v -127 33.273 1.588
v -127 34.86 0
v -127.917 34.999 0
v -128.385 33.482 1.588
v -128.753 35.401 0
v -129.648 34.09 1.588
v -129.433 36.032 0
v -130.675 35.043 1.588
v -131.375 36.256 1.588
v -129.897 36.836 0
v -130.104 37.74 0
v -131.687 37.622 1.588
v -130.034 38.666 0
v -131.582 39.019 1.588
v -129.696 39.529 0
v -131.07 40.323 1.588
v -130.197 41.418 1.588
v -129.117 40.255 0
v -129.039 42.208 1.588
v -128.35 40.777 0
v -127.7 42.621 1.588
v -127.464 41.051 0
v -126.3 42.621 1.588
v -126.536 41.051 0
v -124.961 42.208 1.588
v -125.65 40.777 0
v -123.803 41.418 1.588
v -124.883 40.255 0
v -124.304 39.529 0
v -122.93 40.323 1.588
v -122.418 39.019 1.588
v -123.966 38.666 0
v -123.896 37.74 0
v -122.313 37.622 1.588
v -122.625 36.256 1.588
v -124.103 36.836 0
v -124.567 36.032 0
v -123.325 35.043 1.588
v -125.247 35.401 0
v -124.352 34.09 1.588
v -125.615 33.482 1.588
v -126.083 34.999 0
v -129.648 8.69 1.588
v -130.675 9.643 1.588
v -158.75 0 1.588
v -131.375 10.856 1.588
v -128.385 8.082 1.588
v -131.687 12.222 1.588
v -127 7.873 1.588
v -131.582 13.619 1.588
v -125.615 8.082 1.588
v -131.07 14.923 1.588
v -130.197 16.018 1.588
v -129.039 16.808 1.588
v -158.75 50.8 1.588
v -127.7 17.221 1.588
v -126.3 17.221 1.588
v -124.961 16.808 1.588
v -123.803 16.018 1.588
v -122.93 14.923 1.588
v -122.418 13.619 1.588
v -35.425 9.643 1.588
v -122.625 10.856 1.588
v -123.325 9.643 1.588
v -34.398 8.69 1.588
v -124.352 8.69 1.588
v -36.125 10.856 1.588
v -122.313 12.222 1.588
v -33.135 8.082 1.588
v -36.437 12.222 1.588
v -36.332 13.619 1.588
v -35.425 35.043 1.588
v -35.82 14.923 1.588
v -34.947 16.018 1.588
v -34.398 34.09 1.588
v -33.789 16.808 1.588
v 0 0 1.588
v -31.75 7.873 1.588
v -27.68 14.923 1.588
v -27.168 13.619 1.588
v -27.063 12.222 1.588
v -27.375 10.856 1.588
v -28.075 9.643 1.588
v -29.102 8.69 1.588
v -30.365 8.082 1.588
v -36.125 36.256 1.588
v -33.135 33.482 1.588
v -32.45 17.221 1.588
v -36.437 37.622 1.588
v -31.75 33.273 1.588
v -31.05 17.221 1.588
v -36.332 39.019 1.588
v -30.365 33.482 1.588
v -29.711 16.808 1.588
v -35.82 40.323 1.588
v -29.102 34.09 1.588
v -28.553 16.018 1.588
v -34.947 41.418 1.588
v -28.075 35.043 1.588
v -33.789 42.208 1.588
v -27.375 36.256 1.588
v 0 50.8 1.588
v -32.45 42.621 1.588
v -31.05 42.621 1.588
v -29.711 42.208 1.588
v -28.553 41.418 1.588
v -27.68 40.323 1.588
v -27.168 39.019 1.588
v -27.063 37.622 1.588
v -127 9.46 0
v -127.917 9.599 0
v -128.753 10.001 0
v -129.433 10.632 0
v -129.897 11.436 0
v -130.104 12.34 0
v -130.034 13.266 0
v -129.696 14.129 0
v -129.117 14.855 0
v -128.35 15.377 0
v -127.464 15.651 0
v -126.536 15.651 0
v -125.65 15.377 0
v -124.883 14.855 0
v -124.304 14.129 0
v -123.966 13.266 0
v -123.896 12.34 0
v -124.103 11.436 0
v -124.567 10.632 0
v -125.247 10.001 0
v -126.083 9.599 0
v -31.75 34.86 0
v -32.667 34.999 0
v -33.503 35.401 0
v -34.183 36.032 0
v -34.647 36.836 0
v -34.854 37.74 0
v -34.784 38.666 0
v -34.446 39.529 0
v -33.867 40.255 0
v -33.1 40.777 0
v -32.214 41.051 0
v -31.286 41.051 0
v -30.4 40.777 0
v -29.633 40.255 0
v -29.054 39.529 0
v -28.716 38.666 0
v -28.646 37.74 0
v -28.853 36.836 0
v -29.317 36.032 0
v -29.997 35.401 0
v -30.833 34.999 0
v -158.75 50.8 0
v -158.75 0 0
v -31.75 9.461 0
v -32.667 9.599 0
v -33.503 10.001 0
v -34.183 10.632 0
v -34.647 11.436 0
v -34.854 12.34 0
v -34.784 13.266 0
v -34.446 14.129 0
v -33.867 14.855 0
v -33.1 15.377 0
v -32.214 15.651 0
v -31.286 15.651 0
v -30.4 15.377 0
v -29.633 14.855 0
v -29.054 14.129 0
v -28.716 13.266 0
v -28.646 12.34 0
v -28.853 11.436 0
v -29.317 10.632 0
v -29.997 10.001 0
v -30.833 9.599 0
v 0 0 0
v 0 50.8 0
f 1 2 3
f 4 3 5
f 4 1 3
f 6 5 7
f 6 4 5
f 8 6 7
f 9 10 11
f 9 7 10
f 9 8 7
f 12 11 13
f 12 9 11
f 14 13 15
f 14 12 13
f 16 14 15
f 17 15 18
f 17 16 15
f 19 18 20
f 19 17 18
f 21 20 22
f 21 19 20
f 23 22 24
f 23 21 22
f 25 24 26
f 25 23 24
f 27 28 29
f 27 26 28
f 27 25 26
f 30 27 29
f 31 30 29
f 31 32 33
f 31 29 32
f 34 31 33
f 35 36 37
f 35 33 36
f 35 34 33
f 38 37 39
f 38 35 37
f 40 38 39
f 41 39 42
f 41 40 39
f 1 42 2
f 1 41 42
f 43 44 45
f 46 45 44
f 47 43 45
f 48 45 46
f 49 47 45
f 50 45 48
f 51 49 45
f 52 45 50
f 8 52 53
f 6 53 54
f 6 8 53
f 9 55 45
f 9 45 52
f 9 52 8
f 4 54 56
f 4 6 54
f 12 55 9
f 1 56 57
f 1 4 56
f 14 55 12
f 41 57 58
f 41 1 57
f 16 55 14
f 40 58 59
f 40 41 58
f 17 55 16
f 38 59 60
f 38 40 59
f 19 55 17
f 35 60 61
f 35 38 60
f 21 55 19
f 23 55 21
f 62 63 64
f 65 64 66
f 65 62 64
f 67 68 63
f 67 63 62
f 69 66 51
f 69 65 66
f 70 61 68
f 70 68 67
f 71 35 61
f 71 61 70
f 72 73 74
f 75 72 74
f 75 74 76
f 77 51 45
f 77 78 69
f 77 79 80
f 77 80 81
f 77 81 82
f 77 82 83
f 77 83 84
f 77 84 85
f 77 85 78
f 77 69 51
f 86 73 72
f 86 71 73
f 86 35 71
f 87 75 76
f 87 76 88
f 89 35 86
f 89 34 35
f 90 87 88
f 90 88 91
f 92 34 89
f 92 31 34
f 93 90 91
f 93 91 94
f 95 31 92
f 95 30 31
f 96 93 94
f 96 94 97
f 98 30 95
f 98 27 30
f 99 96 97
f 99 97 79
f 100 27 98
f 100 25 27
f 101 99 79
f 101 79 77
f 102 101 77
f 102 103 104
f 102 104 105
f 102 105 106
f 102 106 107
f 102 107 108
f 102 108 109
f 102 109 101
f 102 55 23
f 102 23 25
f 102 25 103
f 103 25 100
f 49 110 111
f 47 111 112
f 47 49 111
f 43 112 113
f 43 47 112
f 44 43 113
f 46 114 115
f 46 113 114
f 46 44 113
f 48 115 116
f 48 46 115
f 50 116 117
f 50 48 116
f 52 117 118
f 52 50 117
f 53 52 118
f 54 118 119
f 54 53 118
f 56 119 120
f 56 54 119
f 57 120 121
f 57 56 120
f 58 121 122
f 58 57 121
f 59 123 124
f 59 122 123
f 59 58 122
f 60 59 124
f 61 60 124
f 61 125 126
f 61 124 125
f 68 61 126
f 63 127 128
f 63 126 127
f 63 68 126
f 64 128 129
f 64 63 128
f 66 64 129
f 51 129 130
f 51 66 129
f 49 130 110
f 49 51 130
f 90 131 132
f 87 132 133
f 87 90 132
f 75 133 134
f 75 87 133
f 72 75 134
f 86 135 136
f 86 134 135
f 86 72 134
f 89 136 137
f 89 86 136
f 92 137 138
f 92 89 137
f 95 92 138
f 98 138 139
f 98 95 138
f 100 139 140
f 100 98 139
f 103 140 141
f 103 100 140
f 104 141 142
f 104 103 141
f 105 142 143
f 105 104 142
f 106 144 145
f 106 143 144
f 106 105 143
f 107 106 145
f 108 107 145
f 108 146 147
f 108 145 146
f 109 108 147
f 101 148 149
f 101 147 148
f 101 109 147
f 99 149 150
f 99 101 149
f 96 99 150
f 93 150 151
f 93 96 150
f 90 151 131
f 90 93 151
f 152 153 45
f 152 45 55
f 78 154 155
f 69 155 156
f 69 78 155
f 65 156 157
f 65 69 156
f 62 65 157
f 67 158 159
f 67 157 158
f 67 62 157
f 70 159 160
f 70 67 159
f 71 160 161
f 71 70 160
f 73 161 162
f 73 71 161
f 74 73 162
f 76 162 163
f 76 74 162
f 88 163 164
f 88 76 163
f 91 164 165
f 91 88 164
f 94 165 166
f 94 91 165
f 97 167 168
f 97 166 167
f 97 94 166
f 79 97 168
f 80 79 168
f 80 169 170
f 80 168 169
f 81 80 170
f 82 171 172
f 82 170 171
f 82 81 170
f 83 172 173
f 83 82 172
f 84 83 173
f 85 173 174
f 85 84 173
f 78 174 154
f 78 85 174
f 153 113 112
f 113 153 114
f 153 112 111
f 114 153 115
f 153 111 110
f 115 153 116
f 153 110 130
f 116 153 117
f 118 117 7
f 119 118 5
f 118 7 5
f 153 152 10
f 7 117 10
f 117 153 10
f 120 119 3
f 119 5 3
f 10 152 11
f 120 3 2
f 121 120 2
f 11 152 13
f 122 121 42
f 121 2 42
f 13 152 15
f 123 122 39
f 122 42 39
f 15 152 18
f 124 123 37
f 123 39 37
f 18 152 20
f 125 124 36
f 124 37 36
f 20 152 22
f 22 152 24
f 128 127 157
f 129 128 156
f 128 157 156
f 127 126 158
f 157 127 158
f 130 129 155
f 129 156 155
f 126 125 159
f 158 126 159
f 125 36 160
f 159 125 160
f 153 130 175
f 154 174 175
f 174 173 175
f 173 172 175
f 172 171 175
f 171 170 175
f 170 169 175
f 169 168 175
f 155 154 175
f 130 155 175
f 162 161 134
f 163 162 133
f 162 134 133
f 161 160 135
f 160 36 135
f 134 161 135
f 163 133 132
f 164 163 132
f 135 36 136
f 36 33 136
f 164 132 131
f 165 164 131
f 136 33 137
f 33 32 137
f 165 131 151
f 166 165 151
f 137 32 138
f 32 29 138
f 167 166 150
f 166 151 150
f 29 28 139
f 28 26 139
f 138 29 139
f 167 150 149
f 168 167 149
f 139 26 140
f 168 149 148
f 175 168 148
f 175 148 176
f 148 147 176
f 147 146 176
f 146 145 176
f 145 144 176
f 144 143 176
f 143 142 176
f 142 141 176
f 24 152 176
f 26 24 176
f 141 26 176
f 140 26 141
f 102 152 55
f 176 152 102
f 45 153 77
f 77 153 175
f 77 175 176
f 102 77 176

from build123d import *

# Parameters (mm, degrees)
SKETCH1_W                                      = 158.75
SKETCH1_H                                      = 50.8
BOSS_EXTRUDE1_DEPTH                            = 1.5875
CSK_FOR_M4_FLAT_HEAD_MACHINE_SCREW1_AT_2_COUNT = 2
CSK_FOR_M4_FLAT_HEAD_MACHINE_SCREW1_AT_2_PITCH = 25.4
CSK_FOR_M4_FLAT_HEAD_MACHINE_SCREW1_AT_3_COUNT = 2
CSK_FOR_M4_FLAT_HEAD_MACHINE_SCREW1_AT_3_PITCH = 98.578509321
CSK_FOR_M4_FLAT_HEAD_MACHINE_SCREW1_AT_4_COUNT = 2
CSK_FOR_M4_FLAT_HEAD_MACHINE_SCREW1_AT_4_PITCH = 95.25


with BuildPart() as part:
    # Sketch1 → Boss-Extrude1 (new body)
    with BuildSketch(Plane.XY):
        with Locations((-79.375, 25.4)):
            Rectangle(SKETCH1_W, SKETCH1_H)
    extrude(amount=BOSS_EXTRUDE1_DEPTH)

    # Sketch2 → CSK for M4 Flat Head Machine Screw1 (revolve, cut)
    with BuildSketch(Plane(origin=(-127, 37.973, 1.5875), x_dir=(0, -1, 0), z_dir=(1, 0, 0))):
        Polygon((0, 0), (0, 1.5875), (2.25, 1.5875), (2.25, 2.45), (4.7, 0), align=None)
    csk_for_m4_flat_head_machine_screw1 = revolve(axis=Axis((-127, 37.973, 7.9375), (0, 0, -1)), mode=Mode.SUBTRACT)

    # CSK for M4 Flat Head Machine Screw1 at 2: CSK for M4 Flat Head Machine Screw1 ×2
    with Locations(*[(0, -i * CSK_FOR_M4_FLAT_HEAD_MACHINE_SCREW1_AT_2_PITCH, 0) for i in range(1, CSK_FOR_M4_FLAT_HEAD_MACHINE_SCREW1_AT_2_COUNT)]):
        add(csk_for_m4_flat_head_machine_screw1, mode=Mode.SUBTRACT)

    # CSK for M4 Flat Head Machine Screw1 at 3: CSK for M4 Flat Head Machine Screw1 ×2
    with Locations(*[Vector(0.9662349396012463, -0.25766265056033233, 0) * (i * CSK_FOR_M4_FLAT_HEAD_MACHINE_SCREW1_AT_3_PITCH) for i in range(1, CSK_FOR_M4_FLAT_HEAD_MACHINE_SCREW1_AT_3_COUNT)]):
        add(csk_for_m4_flat_head_machine_screw1, mode=Mode.SUBTRACT)

    # CSK for M4 Flat Head Machine Screw1 at 4: CSK for M4 Flat Head Machine Screw1 ×2
    with Locations(*[(i * CSK_FOR_M4_FLAT_HEAD_MACHINE_SCREW1_AT_4_PITCH, 0, 0) for i in range(1, CSK_FOR_M4_FLAT_HEAD_MACHINE_SCREW1_AT_4_COUNT)]):
        add(csk_for_m4_flat_head_machine_screw1, mode=Mode.SUBTRACT)


solid = part.part
